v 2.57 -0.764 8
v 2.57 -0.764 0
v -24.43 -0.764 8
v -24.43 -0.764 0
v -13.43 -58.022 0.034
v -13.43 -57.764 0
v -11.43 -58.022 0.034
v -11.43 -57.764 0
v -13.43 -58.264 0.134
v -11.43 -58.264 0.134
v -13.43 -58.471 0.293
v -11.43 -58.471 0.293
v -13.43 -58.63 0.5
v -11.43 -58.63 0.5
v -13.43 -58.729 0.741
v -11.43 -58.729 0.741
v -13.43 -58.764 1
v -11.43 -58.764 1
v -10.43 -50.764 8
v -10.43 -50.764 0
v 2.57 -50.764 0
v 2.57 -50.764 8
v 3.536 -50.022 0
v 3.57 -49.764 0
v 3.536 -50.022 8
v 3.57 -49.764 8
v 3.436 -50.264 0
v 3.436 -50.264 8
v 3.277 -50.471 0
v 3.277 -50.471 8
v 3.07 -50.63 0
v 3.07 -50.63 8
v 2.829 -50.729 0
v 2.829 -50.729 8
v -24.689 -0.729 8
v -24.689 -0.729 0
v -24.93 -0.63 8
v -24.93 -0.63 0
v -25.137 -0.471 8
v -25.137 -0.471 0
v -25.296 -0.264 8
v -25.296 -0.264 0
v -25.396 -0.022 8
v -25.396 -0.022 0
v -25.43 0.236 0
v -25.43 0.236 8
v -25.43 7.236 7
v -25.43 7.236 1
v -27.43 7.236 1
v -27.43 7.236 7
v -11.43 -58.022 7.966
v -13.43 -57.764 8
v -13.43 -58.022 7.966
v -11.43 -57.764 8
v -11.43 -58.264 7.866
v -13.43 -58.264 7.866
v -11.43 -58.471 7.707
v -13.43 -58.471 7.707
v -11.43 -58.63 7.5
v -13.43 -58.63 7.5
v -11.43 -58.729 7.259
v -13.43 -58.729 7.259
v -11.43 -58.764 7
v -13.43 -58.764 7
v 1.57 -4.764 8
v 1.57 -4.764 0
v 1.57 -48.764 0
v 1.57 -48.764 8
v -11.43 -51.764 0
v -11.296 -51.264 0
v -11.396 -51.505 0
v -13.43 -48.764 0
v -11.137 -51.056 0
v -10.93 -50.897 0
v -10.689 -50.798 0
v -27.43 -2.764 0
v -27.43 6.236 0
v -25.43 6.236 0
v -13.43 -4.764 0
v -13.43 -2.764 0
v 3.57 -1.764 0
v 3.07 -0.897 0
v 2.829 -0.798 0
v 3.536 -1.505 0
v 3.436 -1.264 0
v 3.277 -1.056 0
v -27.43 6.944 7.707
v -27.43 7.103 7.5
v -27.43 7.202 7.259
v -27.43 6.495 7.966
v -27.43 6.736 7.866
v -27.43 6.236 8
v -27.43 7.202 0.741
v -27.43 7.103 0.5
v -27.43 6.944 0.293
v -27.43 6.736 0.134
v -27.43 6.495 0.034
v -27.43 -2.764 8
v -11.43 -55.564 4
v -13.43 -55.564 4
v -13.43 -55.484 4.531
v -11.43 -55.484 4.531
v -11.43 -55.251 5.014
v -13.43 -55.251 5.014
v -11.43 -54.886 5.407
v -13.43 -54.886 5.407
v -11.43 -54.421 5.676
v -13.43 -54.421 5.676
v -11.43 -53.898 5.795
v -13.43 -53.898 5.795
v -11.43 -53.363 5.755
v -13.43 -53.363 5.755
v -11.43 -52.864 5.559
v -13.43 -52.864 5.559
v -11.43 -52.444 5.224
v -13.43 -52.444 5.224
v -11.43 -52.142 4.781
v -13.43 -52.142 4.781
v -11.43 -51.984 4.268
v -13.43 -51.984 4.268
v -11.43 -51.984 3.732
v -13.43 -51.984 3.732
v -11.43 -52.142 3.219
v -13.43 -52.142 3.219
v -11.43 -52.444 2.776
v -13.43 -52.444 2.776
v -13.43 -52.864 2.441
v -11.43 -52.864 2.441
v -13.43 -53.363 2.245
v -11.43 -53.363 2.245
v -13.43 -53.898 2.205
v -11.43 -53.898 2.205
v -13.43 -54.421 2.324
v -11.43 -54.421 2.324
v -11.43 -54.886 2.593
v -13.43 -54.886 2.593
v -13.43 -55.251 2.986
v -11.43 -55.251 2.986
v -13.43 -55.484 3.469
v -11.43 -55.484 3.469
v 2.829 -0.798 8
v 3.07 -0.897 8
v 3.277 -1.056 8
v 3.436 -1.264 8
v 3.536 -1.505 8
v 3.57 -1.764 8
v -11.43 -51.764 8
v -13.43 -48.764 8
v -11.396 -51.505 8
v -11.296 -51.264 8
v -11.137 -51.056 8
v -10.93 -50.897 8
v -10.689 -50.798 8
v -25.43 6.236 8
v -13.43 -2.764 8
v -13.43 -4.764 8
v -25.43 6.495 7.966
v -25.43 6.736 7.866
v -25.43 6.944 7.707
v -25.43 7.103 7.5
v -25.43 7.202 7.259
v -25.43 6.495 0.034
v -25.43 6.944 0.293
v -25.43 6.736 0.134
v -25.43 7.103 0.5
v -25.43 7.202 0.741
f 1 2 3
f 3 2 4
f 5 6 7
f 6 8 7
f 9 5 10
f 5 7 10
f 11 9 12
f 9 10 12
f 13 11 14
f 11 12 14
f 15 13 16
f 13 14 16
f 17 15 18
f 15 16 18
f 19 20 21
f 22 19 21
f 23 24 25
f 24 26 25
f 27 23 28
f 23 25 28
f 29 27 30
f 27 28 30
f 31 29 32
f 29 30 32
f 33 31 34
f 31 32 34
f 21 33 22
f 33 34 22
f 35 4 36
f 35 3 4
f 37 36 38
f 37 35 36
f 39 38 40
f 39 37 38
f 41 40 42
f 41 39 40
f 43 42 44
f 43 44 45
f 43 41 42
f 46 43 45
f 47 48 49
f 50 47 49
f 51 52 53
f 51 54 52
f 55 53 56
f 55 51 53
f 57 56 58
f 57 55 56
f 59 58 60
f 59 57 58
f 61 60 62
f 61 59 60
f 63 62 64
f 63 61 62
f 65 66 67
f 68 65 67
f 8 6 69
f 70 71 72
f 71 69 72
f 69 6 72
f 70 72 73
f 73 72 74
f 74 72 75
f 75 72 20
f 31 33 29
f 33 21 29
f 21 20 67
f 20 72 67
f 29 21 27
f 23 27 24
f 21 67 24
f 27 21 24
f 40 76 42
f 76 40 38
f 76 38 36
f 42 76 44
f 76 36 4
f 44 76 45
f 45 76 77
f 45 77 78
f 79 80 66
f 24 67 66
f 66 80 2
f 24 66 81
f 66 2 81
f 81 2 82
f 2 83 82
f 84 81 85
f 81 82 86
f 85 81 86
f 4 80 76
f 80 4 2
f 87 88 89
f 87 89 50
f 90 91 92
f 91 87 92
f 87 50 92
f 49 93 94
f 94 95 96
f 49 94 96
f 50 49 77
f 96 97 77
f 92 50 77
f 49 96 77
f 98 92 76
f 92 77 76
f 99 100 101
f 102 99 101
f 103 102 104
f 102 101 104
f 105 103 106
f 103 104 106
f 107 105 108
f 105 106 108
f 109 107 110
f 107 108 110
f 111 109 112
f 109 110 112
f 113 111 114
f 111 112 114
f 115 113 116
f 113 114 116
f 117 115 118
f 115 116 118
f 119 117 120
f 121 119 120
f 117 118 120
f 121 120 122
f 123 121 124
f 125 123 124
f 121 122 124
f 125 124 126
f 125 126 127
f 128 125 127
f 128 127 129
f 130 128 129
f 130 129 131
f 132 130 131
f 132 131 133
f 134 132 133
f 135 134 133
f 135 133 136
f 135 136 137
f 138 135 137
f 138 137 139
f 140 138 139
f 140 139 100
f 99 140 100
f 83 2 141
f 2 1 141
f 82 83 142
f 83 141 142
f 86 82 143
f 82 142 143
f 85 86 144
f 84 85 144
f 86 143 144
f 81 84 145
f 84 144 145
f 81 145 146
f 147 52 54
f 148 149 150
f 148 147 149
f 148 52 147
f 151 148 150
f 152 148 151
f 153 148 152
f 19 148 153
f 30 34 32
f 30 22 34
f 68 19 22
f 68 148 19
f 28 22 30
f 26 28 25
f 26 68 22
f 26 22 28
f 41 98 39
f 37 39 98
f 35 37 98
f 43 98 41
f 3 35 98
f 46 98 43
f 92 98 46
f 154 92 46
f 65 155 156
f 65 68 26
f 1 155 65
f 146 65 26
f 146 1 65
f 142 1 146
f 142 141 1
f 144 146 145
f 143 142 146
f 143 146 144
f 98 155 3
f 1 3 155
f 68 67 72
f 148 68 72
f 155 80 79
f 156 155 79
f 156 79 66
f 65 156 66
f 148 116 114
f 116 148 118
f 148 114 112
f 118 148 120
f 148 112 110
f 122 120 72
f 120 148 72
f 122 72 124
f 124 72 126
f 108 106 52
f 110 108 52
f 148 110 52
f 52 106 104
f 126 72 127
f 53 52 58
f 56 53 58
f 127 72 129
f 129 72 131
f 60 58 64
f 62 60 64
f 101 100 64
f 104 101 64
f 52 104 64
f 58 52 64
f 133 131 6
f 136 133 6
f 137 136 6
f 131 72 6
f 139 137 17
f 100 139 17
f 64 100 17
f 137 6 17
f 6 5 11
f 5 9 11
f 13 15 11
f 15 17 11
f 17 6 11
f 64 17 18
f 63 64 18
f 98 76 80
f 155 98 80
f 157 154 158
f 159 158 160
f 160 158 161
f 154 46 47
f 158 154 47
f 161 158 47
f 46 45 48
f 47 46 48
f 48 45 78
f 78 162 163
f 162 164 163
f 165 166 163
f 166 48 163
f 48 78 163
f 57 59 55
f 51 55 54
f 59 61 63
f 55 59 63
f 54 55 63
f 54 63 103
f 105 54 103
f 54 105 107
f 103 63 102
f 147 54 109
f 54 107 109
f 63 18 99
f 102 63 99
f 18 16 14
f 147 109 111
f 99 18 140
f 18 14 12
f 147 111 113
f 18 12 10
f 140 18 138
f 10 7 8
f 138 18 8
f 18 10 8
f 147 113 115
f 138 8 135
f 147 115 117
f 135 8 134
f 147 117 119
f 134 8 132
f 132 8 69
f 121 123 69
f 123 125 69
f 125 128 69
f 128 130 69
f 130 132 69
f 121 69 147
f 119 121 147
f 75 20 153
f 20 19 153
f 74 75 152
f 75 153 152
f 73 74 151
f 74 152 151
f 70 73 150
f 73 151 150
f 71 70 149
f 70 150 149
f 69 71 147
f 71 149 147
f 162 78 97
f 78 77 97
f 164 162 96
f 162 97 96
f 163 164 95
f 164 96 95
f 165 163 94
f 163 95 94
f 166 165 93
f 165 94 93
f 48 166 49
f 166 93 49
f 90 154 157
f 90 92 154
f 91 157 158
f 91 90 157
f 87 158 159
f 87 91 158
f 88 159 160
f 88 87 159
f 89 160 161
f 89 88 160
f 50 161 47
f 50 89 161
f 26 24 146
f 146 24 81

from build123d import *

# Parameters (mm, degrees)
F1_DEPTH = 8
F3_R     = 1.8
F2_R     = 1.8
F4_DEPTH = 25
F5_R     = 1
F6_R     = 1


with BuildPart() as f1:
    # F0 (on Top) → F1 (new body)
    with BuildSketch(Plane.XY):
        Polygon((3.5698827237, -0.7635216035), (-25.4301172763, -0.7635216035), (-25.4301172763, 7.2364783965), (-27.4301172763, 7.2364783965), (-27.4301172763, -2.7635216035), (-13.4301172763, -2.7635216035), (-13.4301172763, -4.7635216035), (1.5698827237, -4.7635216035), (1.5698827237, -48.7635216035), (-13.4301172763, -48.7635216035), (-13.4301172763, -58.7635216035), (-11.4301172763, -58.7635216035), (-11.4301172763, -50.7635216035), (3.5698827237, -50.7635216035), align=None)
    extrude(amount=F1_DEPTH)

    # F3 (on face) + F2 (on face) → F4 (cut)
    with BuildSketch(Plane(origin=(-13.4301172763, 0, 0), x_dir=(0, -1, 0), z_dir=(-1, 0, 0))):
        with Locations((53.7635216035, 4)):
            Circle(F3_R)
    with BuildSketch(Plane.YZ.offset(-25.4301172763)):
        with Locations((3.2364783965, 4)):
            Circle(F2_R)
    extrude(amount=-F4_DEPTH, dir=(-1, 0, 0), mode=Mode.SUBTRACT)

    # F5
    f5_edges = [f1.edges().sort_by_distance(p)[0] for p in [
        (-25.430117, -0.763522, 4),
        (-11.430117, -50.763522, 4),
        (3.569883, -50.763522, 4),
        (3.569883, -0.763522, 4),
    ]]
    fillet(f5_edges, radius=F5_R)

    # F6
    f6_edges = [f1.edges().sort_by_distance(p)[0] for p in [
        (-26.430117, 7.236478, 8),
        (-26.430117, 7.236478, 0),
        (-12.430117, -58.763522, 0),
        (-12.430117, -58.763522, 8),
    ]]
    fillet(f6_edges, radius=F6_R)


solid = f1.part
